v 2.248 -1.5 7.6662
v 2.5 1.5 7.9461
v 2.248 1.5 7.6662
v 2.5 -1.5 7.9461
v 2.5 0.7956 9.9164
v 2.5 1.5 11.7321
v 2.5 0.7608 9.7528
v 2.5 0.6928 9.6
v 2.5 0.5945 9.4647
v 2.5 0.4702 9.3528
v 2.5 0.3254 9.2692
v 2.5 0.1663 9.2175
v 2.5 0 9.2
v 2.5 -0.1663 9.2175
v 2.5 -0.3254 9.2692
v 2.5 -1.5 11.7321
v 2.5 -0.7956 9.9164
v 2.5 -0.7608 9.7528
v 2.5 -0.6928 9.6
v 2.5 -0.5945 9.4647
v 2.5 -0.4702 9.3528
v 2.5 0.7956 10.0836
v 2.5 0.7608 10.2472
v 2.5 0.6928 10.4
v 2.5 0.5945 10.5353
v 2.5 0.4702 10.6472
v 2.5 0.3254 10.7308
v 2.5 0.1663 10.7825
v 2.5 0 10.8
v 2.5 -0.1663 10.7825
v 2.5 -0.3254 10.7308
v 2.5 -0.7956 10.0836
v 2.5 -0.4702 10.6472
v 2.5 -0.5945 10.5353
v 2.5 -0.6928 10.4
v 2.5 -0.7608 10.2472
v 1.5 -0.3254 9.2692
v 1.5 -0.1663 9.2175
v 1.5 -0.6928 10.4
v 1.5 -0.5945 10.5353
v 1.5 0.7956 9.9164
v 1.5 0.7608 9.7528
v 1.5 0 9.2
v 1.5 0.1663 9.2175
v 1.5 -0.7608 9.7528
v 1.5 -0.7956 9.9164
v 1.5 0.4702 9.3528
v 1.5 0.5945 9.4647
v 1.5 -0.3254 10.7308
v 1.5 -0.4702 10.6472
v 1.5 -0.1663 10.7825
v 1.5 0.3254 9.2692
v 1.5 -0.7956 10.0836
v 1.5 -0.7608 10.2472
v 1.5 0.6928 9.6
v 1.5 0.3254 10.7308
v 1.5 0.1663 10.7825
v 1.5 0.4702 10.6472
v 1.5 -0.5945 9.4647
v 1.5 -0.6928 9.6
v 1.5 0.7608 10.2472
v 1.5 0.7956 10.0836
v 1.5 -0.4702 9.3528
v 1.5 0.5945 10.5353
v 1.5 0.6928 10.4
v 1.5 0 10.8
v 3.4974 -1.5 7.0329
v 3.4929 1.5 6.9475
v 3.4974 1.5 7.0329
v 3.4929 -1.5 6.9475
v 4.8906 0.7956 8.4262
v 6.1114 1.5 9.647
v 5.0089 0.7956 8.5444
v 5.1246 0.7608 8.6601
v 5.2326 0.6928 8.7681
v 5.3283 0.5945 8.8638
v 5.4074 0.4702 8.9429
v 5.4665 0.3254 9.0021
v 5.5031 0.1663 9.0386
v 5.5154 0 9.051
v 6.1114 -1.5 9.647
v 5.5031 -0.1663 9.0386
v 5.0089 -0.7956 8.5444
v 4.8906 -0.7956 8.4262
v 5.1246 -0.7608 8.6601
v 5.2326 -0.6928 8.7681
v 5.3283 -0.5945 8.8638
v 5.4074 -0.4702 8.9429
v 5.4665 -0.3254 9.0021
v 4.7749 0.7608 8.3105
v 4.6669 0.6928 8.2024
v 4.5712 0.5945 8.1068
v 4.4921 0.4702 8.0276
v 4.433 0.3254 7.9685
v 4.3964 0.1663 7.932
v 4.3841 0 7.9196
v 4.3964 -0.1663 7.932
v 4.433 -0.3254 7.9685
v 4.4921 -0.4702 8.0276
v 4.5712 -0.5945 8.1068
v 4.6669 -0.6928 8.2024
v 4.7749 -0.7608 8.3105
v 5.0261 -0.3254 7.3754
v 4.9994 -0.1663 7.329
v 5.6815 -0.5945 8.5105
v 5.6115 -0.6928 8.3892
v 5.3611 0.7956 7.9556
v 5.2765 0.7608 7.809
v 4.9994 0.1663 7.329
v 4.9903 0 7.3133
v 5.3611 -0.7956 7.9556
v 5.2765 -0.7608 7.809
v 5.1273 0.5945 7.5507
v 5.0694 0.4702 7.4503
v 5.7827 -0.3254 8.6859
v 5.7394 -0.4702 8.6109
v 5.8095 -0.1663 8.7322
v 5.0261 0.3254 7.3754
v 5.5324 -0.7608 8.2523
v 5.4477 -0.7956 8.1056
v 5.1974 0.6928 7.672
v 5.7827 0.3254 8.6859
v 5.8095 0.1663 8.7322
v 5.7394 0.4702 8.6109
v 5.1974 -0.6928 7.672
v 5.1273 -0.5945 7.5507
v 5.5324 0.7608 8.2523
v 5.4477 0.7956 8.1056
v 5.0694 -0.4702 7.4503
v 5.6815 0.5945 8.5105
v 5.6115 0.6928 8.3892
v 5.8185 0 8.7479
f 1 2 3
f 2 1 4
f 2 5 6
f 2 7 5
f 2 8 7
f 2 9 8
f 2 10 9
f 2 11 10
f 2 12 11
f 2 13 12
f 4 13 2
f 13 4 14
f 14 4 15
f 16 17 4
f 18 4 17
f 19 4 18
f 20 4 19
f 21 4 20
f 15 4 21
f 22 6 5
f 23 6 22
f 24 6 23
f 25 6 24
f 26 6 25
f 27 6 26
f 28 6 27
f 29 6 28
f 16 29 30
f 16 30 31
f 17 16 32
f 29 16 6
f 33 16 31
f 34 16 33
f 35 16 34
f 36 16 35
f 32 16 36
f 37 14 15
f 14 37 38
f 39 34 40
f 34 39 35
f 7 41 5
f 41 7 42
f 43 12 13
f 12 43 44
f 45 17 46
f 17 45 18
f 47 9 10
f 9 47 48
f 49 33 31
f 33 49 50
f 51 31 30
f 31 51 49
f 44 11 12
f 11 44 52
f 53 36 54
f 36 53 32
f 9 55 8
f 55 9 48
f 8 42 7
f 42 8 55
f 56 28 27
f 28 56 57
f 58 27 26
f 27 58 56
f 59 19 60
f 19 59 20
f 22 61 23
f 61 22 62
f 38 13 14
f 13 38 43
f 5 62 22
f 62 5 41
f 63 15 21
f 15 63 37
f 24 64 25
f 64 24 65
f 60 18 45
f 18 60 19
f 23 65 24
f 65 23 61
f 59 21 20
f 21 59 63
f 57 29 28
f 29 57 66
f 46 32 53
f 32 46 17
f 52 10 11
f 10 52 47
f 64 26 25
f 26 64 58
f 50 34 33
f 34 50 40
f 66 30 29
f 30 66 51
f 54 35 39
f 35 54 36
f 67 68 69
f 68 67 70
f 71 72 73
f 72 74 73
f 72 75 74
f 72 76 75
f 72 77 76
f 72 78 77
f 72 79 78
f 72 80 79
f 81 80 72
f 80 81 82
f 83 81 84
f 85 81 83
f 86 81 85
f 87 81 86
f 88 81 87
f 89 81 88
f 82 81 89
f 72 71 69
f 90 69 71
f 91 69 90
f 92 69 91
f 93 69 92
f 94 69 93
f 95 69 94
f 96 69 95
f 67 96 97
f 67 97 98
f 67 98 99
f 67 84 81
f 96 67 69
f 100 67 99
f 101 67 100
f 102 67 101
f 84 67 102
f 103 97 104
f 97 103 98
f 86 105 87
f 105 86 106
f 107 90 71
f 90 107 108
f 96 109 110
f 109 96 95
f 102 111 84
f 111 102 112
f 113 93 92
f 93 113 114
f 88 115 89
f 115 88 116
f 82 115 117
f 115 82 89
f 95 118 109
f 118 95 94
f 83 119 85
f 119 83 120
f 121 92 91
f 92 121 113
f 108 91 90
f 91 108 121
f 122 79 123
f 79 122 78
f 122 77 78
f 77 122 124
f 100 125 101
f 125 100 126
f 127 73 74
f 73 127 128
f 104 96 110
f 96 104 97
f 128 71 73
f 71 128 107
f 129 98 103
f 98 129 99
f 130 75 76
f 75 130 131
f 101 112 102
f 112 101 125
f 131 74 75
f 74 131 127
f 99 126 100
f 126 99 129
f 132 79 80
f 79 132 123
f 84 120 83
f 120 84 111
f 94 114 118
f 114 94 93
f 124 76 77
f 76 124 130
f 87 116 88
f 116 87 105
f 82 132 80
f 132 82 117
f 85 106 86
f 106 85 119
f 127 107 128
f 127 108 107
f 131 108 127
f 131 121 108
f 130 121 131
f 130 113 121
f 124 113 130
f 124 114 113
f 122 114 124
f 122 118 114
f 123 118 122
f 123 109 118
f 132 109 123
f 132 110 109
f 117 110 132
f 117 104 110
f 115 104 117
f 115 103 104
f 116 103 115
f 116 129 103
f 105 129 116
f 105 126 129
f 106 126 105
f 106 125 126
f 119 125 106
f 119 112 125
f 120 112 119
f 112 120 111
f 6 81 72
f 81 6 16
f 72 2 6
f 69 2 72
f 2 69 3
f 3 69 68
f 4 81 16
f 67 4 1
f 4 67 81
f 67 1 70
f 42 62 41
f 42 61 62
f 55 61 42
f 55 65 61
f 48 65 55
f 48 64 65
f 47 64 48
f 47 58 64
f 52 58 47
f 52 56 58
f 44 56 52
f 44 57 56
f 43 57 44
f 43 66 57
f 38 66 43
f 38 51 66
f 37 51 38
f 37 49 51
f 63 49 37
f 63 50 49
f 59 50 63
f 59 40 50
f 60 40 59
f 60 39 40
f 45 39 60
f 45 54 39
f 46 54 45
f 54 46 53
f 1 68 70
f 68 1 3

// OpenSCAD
$fn =30;
module peghole(){
    color("Blue")cylinder (6, .8, .8, true);
}

module edge(){
cylinder (5, 3.25, 3.25, true);
}
module block(){
    intersection(){
edge();
rotate([90,0,0]) edge();
rotate([0, 90, 0]) edge();
}
}
module blox(){
difference(){ 
block();
   peghole();
rotate ([90, 0, 0]) peghole();
rotate ([0, 90, 0]) peghole();
}
}
module cross(){
blox();
translate([5,0,0]) blox();
translate([-5,0,0]) blox();
translate([0,0,5]) blox();
translate([0,0,-5]) blox();
}
module corner(){difference(){
    block();
   translate([-3,-3,3])rotate([0,45,0])
cube([8,6
   ,4]) color("Red");
 rotate([0,45,0]) peghole();   
}
}
module opcorner(){
    translate([5,0,5]) corner();
translate([-5,0,-5]) rotate([0,180,0])corner();
}
module oct() {
    opcorner();
rotate([0,90,0]) opcorner();
    cross();
}
module long(){
    oct();
translate([0,5,0]) oct();
translate([0,-5,0]) oct();
}
//difference(){
//long();
//cube([10,10,5], true);
//cube([5,10,10], true);
//}
module test(){
translate([0,0,10]) blox();
rotate([0,45,0]) translate([0,0,9.5]) blox();
}
module bracketbase(){
    difference(){
rotate([0,30,0])translate([1,0,-1]) cube([5,3,5], true);
translate([-2.5,0,-10]) test();
 translate([-4,-3,-3])cube([3,5,5]);translate([-.5,0,-4.5])rotate([0,30,0]) cube(4, true);    
  }
}
//bracketbase();



//translate([3.25,0,3.25]) rotate([0,45,0]) block();
//difference(){
    translate([2.5,0,10]) bracketbase();
//test();
//oct();

//rotate([0,45,0]) cross();
